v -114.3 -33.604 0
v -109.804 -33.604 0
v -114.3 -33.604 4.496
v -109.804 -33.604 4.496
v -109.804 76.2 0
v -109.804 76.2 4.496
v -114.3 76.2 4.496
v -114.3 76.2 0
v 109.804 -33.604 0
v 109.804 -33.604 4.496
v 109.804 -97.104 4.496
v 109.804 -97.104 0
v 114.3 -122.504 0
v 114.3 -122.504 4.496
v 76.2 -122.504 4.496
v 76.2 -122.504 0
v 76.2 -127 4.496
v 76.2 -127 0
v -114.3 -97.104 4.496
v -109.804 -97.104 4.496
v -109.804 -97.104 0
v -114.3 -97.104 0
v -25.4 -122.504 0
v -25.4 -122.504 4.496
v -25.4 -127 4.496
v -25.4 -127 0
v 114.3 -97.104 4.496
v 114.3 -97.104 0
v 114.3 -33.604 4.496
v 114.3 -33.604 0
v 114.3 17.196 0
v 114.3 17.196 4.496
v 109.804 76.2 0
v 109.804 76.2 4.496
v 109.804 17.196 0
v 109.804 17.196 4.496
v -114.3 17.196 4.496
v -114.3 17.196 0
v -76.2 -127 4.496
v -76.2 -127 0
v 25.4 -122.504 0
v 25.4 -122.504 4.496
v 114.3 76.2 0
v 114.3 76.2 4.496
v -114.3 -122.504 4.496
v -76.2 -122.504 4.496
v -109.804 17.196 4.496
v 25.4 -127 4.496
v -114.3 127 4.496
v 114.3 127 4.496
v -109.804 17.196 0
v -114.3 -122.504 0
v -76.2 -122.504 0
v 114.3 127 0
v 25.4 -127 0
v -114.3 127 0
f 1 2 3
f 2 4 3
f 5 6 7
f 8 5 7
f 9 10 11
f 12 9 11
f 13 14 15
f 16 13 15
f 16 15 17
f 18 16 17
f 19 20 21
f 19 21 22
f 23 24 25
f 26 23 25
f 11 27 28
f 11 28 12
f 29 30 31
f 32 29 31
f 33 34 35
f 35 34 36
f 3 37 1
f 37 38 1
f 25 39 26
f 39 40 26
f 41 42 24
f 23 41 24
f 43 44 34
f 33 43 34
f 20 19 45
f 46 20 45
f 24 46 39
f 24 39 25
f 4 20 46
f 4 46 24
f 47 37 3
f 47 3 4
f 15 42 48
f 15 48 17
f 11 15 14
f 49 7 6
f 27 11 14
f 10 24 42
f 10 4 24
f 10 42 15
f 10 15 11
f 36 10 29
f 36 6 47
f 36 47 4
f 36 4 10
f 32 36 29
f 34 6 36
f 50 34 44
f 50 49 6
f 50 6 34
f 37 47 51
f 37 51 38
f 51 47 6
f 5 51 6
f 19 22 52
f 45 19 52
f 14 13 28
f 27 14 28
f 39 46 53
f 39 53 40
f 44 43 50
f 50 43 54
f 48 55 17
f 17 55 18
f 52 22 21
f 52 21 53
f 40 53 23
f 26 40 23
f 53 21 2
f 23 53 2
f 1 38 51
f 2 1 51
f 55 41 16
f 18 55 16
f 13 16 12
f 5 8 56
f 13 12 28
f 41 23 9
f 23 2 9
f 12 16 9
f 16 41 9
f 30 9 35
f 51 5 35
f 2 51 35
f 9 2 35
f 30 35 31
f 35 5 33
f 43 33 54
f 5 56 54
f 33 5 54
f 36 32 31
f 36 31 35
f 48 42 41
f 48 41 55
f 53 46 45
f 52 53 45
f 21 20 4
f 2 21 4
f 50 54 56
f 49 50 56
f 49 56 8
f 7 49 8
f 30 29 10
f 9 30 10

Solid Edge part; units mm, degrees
sketch "Sketch1" plane through (0, 0, 0) normal (0, 0, 1) x (1, 0, 0)
  line L0 (-114.3, -127) -> (114.3, -127)
  line L1 (114.3, -127) -> (114.3, 127)
  line L2 (114.3, 127) -> (-114.3, 127)
  line L3 (-114.3, 127) -> (-114.3, -127)
  dimension "D1" = 228.6
  dimension "D2" = 254
extrude "Protrusion1" add sketch "Sketch1" along normal blind 4.4958
sketch "Sketch2" plane through (0, 0, 4.4958) normal (0, 0, 1) x (1, 0, 0)
  line L0 (-76.2, -122.5042) -> (-76.2, -127)
  line L1 (-114.3, -127) -> (-76.2, -127)
  line L2 (-114.3, -122.5042) -> (-114.3, -127)
  line L3 (-76.2, -122.5042) -> (-114.3, -122.5042)
  line L4 (25.4, -122.5042) -> (-25.4, -122.5042)
  line L5 (-25.4, -122.5042) -> (-25.4, -127)
  line L6 (-25.4, -127) -> (25.4, -127)
  line L7 (25.4, -122.5042) -> (25.4, -127)
  line L8 (76.2, -122.5042) -> (76.2, -127)
  line L9 (76.2, -127) -> (114.3, -127)
  line L10 (114.3, -127) -> (114.3, -122.5042)
  line L11 (114.3, -122.5042) -> (76.2, -122.5042)
extrude "Cutout1" cut sketch "Sketch2" against normal through all
sketch "Sketch3" plane through (0, 0, 4.4958) normal (0, 0, 1) x (1, 0, 0)
  line L0 (-109.8042, -97.1042) -> (-109.8042, -33.6042)
  line L1 (-109.8042, -33.6042) -> (-114.3, -33.6042)
  line L2 (-114.3, -33.6042) -> (-114.3, -97.1042)
  line L3 (-109.8042, -97.1042) -> (-114.3, -97.1042)
  line L4 (-114.3, 76.2) -> (-114.3, 17.1958)
  line L5 (-109.8042, 17.1958) -> (-114.3, 17.1958)
  line L6 (-109.8042, 17.1958) -> (-109.8042, 76.2)
  line L7 (-109.8042, 76.2) -> (-114.3, 76.2)
extrude "Cutout2" cut sketch "Sketch3" against normal through all
mirror "Mirror1" about plane through (0, 0, 0) normal (-1, 0, 0) of "Cutout2"
properties material "Acrylic, high impact grade"
